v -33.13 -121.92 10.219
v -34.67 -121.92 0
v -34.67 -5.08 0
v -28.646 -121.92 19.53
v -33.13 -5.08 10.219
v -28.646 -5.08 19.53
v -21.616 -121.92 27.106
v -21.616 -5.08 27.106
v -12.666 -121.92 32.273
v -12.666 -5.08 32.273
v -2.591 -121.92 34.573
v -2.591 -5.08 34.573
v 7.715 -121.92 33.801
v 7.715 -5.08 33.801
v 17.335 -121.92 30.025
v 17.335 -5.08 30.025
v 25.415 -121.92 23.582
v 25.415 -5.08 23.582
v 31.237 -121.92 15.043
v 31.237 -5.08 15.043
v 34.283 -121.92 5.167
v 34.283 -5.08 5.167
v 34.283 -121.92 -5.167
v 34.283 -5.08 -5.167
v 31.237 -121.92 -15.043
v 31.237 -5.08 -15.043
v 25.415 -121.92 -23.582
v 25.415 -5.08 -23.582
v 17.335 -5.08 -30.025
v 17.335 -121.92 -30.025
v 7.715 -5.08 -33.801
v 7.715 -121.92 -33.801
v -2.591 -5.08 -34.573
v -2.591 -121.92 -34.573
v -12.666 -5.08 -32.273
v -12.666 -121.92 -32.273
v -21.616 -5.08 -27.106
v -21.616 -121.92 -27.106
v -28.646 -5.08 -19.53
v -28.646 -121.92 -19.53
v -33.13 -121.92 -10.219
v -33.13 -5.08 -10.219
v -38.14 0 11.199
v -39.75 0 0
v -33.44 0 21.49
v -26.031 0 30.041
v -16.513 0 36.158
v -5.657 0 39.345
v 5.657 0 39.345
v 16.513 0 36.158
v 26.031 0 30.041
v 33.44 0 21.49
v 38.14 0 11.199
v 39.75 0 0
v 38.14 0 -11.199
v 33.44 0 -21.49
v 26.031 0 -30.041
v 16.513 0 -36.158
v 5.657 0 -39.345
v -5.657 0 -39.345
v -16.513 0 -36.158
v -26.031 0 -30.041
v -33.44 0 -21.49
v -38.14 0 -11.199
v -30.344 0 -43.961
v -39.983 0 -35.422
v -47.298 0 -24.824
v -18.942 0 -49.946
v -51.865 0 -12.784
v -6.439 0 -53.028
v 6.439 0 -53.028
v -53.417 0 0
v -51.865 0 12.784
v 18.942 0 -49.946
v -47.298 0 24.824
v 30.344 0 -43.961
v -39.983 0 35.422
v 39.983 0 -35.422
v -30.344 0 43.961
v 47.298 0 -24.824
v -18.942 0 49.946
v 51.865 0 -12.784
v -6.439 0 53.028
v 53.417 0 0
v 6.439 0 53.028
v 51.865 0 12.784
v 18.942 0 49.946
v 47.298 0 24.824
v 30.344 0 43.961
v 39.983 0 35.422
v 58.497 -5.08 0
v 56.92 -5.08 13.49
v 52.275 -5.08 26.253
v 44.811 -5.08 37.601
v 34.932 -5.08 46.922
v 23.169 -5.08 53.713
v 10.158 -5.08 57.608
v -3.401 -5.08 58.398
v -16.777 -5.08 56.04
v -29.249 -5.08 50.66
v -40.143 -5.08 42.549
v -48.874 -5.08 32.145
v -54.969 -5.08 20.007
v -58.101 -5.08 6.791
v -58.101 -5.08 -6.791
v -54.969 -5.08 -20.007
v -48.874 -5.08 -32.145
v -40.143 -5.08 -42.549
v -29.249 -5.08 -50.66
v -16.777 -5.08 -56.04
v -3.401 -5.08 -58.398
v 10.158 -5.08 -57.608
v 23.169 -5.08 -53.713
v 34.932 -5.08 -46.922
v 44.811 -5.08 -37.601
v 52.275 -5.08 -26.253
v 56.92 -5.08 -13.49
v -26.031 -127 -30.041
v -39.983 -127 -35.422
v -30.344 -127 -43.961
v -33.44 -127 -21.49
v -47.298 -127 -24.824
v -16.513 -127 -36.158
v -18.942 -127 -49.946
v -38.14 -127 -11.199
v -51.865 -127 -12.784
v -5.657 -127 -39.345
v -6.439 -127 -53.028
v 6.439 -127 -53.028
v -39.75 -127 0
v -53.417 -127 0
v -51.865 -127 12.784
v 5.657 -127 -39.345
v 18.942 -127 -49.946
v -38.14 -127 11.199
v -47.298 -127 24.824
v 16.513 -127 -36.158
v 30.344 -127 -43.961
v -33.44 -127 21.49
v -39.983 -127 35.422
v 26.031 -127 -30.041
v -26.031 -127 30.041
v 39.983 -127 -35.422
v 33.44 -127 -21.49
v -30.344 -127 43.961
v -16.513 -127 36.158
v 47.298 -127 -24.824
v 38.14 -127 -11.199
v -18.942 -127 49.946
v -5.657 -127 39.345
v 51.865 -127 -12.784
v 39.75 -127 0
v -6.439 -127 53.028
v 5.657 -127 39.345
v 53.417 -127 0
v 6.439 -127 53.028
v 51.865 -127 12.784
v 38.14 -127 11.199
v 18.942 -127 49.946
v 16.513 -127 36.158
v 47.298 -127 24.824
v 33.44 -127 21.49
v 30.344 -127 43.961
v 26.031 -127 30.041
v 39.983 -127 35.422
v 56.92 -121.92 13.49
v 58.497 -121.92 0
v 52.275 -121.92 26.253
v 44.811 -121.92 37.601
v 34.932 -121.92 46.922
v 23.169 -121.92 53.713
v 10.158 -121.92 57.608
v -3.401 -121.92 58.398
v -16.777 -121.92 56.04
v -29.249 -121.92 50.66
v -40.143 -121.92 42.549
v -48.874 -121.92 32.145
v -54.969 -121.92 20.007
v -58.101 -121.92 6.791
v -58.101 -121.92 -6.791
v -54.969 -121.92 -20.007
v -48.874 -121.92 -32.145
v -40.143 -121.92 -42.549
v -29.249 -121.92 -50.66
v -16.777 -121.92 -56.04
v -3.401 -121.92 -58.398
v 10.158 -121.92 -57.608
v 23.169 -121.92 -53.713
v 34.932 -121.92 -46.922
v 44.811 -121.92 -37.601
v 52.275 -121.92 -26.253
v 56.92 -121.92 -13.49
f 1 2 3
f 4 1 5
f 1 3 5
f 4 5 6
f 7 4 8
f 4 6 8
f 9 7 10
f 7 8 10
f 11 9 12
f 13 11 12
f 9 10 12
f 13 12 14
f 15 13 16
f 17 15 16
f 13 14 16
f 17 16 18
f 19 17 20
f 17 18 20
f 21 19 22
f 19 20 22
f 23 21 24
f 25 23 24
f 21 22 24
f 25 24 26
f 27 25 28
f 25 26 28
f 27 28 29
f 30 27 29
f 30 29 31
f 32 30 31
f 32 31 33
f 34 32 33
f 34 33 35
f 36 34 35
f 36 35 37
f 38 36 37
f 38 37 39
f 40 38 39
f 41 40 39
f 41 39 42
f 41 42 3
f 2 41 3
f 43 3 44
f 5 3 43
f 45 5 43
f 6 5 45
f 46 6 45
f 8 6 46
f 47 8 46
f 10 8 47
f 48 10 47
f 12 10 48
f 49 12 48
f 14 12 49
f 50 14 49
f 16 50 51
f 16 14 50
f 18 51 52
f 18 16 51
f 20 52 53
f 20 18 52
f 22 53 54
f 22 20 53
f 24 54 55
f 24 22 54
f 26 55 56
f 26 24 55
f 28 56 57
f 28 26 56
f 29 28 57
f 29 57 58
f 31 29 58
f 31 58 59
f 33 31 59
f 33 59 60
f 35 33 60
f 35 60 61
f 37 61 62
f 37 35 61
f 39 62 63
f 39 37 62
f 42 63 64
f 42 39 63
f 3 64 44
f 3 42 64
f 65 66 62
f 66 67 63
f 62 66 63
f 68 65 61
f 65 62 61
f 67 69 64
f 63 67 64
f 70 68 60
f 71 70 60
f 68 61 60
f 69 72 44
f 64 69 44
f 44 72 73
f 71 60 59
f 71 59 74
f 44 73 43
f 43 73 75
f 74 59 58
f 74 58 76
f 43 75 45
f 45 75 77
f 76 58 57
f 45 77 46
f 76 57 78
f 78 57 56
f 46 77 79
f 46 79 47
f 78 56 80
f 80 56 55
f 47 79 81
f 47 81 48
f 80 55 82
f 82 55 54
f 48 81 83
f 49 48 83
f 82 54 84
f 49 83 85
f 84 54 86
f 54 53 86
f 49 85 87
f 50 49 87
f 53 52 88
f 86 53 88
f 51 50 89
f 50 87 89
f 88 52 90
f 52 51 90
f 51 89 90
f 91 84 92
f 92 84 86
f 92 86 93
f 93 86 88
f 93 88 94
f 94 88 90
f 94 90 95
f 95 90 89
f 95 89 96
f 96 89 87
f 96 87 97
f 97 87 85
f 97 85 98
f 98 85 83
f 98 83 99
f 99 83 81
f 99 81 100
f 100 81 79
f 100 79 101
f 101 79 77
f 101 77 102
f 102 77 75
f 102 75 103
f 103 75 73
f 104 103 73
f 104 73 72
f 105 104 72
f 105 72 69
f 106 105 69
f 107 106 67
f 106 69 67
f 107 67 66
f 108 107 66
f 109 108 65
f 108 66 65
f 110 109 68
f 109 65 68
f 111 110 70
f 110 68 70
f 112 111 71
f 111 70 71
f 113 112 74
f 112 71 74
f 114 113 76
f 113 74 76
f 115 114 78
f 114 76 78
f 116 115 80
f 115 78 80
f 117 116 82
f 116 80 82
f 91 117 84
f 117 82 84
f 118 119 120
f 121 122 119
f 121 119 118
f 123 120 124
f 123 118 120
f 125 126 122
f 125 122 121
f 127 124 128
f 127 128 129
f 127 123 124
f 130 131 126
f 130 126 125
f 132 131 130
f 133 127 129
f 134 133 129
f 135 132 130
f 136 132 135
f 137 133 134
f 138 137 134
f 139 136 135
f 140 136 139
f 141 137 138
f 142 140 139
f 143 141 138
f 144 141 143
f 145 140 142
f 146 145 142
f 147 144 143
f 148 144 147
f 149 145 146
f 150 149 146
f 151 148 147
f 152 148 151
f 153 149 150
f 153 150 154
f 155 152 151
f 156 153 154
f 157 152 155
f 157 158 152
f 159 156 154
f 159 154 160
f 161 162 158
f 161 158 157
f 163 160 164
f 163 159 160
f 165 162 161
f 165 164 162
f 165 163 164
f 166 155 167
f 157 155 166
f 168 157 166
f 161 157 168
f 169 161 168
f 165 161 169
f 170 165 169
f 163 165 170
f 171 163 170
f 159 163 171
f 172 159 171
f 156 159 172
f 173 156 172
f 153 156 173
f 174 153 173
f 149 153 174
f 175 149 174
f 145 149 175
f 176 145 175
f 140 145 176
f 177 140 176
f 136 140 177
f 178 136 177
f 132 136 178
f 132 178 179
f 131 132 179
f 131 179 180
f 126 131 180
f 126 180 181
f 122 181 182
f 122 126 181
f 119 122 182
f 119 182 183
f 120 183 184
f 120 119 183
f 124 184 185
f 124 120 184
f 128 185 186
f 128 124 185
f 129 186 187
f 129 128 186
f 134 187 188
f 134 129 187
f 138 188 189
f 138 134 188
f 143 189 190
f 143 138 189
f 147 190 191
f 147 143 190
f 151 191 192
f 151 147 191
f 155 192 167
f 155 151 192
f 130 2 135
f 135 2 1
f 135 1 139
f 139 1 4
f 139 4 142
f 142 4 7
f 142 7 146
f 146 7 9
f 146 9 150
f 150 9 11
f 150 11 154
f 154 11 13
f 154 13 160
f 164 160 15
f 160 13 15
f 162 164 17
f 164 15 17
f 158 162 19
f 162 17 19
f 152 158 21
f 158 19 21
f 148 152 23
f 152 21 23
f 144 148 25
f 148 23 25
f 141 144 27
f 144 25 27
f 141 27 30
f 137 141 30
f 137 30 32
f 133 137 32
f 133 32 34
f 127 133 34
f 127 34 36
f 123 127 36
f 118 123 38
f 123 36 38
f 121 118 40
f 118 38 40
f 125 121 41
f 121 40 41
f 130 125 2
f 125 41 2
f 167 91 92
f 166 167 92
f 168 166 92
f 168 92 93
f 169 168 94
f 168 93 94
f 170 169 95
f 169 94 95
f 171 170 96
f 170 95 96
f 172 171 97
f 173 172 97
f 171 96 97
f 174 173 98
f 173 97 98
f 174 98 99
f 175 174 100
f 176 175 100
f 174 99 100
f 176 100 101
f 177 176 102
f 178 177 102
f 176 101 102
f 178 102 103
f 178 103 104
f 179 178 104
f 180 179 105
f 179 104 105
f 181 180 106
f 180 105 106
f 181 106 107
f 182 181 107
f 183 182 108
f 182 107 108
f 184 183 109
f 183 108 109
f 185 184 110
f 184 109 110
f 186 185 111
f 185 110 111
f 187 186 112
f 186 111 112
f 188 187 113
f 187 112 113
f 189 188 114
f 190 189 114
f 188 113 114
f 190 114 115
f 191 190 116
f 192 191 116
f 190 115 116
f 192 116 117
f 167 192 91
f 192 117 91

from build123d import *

# Parameters (mm, degrees)
F0_R     = 58.497005
F1_DEPTH = 127
F2_R     = 34.670049
F3_DEPTH = 127.001
F4_SIZE  = 5.08


with BuildPart() as f1:
    # F0 (on Front) → F1 (new body)
    with BuildSketch(Plane.XZ):
        Circle(F0_R)
    extrude(amount=F1_DEPTH)

    # F2 (on face) → F3 (cut, through all)
    with BuildSketch(Plane(origin=(0, 0, 0), x_dir=(-1, 0, 0), z_dir=(0, 1, 0))):
        Circle(F2_R)
    extrude(amount=-F3_DEPTH, mode=Mode.SUBTRACT)

    # F4
    f4_edges = [f1.edges().sort_by_distance(p)[0] for p in [
        (-58.497005, 0, 0),
        (34.670049, 0, 0),
        (-58.497005, -127, 0),
        (34.670049, -127, 0),
    ]]
    chamfer(f4_edges, length=F4_SIZE)


solid = f1.part
